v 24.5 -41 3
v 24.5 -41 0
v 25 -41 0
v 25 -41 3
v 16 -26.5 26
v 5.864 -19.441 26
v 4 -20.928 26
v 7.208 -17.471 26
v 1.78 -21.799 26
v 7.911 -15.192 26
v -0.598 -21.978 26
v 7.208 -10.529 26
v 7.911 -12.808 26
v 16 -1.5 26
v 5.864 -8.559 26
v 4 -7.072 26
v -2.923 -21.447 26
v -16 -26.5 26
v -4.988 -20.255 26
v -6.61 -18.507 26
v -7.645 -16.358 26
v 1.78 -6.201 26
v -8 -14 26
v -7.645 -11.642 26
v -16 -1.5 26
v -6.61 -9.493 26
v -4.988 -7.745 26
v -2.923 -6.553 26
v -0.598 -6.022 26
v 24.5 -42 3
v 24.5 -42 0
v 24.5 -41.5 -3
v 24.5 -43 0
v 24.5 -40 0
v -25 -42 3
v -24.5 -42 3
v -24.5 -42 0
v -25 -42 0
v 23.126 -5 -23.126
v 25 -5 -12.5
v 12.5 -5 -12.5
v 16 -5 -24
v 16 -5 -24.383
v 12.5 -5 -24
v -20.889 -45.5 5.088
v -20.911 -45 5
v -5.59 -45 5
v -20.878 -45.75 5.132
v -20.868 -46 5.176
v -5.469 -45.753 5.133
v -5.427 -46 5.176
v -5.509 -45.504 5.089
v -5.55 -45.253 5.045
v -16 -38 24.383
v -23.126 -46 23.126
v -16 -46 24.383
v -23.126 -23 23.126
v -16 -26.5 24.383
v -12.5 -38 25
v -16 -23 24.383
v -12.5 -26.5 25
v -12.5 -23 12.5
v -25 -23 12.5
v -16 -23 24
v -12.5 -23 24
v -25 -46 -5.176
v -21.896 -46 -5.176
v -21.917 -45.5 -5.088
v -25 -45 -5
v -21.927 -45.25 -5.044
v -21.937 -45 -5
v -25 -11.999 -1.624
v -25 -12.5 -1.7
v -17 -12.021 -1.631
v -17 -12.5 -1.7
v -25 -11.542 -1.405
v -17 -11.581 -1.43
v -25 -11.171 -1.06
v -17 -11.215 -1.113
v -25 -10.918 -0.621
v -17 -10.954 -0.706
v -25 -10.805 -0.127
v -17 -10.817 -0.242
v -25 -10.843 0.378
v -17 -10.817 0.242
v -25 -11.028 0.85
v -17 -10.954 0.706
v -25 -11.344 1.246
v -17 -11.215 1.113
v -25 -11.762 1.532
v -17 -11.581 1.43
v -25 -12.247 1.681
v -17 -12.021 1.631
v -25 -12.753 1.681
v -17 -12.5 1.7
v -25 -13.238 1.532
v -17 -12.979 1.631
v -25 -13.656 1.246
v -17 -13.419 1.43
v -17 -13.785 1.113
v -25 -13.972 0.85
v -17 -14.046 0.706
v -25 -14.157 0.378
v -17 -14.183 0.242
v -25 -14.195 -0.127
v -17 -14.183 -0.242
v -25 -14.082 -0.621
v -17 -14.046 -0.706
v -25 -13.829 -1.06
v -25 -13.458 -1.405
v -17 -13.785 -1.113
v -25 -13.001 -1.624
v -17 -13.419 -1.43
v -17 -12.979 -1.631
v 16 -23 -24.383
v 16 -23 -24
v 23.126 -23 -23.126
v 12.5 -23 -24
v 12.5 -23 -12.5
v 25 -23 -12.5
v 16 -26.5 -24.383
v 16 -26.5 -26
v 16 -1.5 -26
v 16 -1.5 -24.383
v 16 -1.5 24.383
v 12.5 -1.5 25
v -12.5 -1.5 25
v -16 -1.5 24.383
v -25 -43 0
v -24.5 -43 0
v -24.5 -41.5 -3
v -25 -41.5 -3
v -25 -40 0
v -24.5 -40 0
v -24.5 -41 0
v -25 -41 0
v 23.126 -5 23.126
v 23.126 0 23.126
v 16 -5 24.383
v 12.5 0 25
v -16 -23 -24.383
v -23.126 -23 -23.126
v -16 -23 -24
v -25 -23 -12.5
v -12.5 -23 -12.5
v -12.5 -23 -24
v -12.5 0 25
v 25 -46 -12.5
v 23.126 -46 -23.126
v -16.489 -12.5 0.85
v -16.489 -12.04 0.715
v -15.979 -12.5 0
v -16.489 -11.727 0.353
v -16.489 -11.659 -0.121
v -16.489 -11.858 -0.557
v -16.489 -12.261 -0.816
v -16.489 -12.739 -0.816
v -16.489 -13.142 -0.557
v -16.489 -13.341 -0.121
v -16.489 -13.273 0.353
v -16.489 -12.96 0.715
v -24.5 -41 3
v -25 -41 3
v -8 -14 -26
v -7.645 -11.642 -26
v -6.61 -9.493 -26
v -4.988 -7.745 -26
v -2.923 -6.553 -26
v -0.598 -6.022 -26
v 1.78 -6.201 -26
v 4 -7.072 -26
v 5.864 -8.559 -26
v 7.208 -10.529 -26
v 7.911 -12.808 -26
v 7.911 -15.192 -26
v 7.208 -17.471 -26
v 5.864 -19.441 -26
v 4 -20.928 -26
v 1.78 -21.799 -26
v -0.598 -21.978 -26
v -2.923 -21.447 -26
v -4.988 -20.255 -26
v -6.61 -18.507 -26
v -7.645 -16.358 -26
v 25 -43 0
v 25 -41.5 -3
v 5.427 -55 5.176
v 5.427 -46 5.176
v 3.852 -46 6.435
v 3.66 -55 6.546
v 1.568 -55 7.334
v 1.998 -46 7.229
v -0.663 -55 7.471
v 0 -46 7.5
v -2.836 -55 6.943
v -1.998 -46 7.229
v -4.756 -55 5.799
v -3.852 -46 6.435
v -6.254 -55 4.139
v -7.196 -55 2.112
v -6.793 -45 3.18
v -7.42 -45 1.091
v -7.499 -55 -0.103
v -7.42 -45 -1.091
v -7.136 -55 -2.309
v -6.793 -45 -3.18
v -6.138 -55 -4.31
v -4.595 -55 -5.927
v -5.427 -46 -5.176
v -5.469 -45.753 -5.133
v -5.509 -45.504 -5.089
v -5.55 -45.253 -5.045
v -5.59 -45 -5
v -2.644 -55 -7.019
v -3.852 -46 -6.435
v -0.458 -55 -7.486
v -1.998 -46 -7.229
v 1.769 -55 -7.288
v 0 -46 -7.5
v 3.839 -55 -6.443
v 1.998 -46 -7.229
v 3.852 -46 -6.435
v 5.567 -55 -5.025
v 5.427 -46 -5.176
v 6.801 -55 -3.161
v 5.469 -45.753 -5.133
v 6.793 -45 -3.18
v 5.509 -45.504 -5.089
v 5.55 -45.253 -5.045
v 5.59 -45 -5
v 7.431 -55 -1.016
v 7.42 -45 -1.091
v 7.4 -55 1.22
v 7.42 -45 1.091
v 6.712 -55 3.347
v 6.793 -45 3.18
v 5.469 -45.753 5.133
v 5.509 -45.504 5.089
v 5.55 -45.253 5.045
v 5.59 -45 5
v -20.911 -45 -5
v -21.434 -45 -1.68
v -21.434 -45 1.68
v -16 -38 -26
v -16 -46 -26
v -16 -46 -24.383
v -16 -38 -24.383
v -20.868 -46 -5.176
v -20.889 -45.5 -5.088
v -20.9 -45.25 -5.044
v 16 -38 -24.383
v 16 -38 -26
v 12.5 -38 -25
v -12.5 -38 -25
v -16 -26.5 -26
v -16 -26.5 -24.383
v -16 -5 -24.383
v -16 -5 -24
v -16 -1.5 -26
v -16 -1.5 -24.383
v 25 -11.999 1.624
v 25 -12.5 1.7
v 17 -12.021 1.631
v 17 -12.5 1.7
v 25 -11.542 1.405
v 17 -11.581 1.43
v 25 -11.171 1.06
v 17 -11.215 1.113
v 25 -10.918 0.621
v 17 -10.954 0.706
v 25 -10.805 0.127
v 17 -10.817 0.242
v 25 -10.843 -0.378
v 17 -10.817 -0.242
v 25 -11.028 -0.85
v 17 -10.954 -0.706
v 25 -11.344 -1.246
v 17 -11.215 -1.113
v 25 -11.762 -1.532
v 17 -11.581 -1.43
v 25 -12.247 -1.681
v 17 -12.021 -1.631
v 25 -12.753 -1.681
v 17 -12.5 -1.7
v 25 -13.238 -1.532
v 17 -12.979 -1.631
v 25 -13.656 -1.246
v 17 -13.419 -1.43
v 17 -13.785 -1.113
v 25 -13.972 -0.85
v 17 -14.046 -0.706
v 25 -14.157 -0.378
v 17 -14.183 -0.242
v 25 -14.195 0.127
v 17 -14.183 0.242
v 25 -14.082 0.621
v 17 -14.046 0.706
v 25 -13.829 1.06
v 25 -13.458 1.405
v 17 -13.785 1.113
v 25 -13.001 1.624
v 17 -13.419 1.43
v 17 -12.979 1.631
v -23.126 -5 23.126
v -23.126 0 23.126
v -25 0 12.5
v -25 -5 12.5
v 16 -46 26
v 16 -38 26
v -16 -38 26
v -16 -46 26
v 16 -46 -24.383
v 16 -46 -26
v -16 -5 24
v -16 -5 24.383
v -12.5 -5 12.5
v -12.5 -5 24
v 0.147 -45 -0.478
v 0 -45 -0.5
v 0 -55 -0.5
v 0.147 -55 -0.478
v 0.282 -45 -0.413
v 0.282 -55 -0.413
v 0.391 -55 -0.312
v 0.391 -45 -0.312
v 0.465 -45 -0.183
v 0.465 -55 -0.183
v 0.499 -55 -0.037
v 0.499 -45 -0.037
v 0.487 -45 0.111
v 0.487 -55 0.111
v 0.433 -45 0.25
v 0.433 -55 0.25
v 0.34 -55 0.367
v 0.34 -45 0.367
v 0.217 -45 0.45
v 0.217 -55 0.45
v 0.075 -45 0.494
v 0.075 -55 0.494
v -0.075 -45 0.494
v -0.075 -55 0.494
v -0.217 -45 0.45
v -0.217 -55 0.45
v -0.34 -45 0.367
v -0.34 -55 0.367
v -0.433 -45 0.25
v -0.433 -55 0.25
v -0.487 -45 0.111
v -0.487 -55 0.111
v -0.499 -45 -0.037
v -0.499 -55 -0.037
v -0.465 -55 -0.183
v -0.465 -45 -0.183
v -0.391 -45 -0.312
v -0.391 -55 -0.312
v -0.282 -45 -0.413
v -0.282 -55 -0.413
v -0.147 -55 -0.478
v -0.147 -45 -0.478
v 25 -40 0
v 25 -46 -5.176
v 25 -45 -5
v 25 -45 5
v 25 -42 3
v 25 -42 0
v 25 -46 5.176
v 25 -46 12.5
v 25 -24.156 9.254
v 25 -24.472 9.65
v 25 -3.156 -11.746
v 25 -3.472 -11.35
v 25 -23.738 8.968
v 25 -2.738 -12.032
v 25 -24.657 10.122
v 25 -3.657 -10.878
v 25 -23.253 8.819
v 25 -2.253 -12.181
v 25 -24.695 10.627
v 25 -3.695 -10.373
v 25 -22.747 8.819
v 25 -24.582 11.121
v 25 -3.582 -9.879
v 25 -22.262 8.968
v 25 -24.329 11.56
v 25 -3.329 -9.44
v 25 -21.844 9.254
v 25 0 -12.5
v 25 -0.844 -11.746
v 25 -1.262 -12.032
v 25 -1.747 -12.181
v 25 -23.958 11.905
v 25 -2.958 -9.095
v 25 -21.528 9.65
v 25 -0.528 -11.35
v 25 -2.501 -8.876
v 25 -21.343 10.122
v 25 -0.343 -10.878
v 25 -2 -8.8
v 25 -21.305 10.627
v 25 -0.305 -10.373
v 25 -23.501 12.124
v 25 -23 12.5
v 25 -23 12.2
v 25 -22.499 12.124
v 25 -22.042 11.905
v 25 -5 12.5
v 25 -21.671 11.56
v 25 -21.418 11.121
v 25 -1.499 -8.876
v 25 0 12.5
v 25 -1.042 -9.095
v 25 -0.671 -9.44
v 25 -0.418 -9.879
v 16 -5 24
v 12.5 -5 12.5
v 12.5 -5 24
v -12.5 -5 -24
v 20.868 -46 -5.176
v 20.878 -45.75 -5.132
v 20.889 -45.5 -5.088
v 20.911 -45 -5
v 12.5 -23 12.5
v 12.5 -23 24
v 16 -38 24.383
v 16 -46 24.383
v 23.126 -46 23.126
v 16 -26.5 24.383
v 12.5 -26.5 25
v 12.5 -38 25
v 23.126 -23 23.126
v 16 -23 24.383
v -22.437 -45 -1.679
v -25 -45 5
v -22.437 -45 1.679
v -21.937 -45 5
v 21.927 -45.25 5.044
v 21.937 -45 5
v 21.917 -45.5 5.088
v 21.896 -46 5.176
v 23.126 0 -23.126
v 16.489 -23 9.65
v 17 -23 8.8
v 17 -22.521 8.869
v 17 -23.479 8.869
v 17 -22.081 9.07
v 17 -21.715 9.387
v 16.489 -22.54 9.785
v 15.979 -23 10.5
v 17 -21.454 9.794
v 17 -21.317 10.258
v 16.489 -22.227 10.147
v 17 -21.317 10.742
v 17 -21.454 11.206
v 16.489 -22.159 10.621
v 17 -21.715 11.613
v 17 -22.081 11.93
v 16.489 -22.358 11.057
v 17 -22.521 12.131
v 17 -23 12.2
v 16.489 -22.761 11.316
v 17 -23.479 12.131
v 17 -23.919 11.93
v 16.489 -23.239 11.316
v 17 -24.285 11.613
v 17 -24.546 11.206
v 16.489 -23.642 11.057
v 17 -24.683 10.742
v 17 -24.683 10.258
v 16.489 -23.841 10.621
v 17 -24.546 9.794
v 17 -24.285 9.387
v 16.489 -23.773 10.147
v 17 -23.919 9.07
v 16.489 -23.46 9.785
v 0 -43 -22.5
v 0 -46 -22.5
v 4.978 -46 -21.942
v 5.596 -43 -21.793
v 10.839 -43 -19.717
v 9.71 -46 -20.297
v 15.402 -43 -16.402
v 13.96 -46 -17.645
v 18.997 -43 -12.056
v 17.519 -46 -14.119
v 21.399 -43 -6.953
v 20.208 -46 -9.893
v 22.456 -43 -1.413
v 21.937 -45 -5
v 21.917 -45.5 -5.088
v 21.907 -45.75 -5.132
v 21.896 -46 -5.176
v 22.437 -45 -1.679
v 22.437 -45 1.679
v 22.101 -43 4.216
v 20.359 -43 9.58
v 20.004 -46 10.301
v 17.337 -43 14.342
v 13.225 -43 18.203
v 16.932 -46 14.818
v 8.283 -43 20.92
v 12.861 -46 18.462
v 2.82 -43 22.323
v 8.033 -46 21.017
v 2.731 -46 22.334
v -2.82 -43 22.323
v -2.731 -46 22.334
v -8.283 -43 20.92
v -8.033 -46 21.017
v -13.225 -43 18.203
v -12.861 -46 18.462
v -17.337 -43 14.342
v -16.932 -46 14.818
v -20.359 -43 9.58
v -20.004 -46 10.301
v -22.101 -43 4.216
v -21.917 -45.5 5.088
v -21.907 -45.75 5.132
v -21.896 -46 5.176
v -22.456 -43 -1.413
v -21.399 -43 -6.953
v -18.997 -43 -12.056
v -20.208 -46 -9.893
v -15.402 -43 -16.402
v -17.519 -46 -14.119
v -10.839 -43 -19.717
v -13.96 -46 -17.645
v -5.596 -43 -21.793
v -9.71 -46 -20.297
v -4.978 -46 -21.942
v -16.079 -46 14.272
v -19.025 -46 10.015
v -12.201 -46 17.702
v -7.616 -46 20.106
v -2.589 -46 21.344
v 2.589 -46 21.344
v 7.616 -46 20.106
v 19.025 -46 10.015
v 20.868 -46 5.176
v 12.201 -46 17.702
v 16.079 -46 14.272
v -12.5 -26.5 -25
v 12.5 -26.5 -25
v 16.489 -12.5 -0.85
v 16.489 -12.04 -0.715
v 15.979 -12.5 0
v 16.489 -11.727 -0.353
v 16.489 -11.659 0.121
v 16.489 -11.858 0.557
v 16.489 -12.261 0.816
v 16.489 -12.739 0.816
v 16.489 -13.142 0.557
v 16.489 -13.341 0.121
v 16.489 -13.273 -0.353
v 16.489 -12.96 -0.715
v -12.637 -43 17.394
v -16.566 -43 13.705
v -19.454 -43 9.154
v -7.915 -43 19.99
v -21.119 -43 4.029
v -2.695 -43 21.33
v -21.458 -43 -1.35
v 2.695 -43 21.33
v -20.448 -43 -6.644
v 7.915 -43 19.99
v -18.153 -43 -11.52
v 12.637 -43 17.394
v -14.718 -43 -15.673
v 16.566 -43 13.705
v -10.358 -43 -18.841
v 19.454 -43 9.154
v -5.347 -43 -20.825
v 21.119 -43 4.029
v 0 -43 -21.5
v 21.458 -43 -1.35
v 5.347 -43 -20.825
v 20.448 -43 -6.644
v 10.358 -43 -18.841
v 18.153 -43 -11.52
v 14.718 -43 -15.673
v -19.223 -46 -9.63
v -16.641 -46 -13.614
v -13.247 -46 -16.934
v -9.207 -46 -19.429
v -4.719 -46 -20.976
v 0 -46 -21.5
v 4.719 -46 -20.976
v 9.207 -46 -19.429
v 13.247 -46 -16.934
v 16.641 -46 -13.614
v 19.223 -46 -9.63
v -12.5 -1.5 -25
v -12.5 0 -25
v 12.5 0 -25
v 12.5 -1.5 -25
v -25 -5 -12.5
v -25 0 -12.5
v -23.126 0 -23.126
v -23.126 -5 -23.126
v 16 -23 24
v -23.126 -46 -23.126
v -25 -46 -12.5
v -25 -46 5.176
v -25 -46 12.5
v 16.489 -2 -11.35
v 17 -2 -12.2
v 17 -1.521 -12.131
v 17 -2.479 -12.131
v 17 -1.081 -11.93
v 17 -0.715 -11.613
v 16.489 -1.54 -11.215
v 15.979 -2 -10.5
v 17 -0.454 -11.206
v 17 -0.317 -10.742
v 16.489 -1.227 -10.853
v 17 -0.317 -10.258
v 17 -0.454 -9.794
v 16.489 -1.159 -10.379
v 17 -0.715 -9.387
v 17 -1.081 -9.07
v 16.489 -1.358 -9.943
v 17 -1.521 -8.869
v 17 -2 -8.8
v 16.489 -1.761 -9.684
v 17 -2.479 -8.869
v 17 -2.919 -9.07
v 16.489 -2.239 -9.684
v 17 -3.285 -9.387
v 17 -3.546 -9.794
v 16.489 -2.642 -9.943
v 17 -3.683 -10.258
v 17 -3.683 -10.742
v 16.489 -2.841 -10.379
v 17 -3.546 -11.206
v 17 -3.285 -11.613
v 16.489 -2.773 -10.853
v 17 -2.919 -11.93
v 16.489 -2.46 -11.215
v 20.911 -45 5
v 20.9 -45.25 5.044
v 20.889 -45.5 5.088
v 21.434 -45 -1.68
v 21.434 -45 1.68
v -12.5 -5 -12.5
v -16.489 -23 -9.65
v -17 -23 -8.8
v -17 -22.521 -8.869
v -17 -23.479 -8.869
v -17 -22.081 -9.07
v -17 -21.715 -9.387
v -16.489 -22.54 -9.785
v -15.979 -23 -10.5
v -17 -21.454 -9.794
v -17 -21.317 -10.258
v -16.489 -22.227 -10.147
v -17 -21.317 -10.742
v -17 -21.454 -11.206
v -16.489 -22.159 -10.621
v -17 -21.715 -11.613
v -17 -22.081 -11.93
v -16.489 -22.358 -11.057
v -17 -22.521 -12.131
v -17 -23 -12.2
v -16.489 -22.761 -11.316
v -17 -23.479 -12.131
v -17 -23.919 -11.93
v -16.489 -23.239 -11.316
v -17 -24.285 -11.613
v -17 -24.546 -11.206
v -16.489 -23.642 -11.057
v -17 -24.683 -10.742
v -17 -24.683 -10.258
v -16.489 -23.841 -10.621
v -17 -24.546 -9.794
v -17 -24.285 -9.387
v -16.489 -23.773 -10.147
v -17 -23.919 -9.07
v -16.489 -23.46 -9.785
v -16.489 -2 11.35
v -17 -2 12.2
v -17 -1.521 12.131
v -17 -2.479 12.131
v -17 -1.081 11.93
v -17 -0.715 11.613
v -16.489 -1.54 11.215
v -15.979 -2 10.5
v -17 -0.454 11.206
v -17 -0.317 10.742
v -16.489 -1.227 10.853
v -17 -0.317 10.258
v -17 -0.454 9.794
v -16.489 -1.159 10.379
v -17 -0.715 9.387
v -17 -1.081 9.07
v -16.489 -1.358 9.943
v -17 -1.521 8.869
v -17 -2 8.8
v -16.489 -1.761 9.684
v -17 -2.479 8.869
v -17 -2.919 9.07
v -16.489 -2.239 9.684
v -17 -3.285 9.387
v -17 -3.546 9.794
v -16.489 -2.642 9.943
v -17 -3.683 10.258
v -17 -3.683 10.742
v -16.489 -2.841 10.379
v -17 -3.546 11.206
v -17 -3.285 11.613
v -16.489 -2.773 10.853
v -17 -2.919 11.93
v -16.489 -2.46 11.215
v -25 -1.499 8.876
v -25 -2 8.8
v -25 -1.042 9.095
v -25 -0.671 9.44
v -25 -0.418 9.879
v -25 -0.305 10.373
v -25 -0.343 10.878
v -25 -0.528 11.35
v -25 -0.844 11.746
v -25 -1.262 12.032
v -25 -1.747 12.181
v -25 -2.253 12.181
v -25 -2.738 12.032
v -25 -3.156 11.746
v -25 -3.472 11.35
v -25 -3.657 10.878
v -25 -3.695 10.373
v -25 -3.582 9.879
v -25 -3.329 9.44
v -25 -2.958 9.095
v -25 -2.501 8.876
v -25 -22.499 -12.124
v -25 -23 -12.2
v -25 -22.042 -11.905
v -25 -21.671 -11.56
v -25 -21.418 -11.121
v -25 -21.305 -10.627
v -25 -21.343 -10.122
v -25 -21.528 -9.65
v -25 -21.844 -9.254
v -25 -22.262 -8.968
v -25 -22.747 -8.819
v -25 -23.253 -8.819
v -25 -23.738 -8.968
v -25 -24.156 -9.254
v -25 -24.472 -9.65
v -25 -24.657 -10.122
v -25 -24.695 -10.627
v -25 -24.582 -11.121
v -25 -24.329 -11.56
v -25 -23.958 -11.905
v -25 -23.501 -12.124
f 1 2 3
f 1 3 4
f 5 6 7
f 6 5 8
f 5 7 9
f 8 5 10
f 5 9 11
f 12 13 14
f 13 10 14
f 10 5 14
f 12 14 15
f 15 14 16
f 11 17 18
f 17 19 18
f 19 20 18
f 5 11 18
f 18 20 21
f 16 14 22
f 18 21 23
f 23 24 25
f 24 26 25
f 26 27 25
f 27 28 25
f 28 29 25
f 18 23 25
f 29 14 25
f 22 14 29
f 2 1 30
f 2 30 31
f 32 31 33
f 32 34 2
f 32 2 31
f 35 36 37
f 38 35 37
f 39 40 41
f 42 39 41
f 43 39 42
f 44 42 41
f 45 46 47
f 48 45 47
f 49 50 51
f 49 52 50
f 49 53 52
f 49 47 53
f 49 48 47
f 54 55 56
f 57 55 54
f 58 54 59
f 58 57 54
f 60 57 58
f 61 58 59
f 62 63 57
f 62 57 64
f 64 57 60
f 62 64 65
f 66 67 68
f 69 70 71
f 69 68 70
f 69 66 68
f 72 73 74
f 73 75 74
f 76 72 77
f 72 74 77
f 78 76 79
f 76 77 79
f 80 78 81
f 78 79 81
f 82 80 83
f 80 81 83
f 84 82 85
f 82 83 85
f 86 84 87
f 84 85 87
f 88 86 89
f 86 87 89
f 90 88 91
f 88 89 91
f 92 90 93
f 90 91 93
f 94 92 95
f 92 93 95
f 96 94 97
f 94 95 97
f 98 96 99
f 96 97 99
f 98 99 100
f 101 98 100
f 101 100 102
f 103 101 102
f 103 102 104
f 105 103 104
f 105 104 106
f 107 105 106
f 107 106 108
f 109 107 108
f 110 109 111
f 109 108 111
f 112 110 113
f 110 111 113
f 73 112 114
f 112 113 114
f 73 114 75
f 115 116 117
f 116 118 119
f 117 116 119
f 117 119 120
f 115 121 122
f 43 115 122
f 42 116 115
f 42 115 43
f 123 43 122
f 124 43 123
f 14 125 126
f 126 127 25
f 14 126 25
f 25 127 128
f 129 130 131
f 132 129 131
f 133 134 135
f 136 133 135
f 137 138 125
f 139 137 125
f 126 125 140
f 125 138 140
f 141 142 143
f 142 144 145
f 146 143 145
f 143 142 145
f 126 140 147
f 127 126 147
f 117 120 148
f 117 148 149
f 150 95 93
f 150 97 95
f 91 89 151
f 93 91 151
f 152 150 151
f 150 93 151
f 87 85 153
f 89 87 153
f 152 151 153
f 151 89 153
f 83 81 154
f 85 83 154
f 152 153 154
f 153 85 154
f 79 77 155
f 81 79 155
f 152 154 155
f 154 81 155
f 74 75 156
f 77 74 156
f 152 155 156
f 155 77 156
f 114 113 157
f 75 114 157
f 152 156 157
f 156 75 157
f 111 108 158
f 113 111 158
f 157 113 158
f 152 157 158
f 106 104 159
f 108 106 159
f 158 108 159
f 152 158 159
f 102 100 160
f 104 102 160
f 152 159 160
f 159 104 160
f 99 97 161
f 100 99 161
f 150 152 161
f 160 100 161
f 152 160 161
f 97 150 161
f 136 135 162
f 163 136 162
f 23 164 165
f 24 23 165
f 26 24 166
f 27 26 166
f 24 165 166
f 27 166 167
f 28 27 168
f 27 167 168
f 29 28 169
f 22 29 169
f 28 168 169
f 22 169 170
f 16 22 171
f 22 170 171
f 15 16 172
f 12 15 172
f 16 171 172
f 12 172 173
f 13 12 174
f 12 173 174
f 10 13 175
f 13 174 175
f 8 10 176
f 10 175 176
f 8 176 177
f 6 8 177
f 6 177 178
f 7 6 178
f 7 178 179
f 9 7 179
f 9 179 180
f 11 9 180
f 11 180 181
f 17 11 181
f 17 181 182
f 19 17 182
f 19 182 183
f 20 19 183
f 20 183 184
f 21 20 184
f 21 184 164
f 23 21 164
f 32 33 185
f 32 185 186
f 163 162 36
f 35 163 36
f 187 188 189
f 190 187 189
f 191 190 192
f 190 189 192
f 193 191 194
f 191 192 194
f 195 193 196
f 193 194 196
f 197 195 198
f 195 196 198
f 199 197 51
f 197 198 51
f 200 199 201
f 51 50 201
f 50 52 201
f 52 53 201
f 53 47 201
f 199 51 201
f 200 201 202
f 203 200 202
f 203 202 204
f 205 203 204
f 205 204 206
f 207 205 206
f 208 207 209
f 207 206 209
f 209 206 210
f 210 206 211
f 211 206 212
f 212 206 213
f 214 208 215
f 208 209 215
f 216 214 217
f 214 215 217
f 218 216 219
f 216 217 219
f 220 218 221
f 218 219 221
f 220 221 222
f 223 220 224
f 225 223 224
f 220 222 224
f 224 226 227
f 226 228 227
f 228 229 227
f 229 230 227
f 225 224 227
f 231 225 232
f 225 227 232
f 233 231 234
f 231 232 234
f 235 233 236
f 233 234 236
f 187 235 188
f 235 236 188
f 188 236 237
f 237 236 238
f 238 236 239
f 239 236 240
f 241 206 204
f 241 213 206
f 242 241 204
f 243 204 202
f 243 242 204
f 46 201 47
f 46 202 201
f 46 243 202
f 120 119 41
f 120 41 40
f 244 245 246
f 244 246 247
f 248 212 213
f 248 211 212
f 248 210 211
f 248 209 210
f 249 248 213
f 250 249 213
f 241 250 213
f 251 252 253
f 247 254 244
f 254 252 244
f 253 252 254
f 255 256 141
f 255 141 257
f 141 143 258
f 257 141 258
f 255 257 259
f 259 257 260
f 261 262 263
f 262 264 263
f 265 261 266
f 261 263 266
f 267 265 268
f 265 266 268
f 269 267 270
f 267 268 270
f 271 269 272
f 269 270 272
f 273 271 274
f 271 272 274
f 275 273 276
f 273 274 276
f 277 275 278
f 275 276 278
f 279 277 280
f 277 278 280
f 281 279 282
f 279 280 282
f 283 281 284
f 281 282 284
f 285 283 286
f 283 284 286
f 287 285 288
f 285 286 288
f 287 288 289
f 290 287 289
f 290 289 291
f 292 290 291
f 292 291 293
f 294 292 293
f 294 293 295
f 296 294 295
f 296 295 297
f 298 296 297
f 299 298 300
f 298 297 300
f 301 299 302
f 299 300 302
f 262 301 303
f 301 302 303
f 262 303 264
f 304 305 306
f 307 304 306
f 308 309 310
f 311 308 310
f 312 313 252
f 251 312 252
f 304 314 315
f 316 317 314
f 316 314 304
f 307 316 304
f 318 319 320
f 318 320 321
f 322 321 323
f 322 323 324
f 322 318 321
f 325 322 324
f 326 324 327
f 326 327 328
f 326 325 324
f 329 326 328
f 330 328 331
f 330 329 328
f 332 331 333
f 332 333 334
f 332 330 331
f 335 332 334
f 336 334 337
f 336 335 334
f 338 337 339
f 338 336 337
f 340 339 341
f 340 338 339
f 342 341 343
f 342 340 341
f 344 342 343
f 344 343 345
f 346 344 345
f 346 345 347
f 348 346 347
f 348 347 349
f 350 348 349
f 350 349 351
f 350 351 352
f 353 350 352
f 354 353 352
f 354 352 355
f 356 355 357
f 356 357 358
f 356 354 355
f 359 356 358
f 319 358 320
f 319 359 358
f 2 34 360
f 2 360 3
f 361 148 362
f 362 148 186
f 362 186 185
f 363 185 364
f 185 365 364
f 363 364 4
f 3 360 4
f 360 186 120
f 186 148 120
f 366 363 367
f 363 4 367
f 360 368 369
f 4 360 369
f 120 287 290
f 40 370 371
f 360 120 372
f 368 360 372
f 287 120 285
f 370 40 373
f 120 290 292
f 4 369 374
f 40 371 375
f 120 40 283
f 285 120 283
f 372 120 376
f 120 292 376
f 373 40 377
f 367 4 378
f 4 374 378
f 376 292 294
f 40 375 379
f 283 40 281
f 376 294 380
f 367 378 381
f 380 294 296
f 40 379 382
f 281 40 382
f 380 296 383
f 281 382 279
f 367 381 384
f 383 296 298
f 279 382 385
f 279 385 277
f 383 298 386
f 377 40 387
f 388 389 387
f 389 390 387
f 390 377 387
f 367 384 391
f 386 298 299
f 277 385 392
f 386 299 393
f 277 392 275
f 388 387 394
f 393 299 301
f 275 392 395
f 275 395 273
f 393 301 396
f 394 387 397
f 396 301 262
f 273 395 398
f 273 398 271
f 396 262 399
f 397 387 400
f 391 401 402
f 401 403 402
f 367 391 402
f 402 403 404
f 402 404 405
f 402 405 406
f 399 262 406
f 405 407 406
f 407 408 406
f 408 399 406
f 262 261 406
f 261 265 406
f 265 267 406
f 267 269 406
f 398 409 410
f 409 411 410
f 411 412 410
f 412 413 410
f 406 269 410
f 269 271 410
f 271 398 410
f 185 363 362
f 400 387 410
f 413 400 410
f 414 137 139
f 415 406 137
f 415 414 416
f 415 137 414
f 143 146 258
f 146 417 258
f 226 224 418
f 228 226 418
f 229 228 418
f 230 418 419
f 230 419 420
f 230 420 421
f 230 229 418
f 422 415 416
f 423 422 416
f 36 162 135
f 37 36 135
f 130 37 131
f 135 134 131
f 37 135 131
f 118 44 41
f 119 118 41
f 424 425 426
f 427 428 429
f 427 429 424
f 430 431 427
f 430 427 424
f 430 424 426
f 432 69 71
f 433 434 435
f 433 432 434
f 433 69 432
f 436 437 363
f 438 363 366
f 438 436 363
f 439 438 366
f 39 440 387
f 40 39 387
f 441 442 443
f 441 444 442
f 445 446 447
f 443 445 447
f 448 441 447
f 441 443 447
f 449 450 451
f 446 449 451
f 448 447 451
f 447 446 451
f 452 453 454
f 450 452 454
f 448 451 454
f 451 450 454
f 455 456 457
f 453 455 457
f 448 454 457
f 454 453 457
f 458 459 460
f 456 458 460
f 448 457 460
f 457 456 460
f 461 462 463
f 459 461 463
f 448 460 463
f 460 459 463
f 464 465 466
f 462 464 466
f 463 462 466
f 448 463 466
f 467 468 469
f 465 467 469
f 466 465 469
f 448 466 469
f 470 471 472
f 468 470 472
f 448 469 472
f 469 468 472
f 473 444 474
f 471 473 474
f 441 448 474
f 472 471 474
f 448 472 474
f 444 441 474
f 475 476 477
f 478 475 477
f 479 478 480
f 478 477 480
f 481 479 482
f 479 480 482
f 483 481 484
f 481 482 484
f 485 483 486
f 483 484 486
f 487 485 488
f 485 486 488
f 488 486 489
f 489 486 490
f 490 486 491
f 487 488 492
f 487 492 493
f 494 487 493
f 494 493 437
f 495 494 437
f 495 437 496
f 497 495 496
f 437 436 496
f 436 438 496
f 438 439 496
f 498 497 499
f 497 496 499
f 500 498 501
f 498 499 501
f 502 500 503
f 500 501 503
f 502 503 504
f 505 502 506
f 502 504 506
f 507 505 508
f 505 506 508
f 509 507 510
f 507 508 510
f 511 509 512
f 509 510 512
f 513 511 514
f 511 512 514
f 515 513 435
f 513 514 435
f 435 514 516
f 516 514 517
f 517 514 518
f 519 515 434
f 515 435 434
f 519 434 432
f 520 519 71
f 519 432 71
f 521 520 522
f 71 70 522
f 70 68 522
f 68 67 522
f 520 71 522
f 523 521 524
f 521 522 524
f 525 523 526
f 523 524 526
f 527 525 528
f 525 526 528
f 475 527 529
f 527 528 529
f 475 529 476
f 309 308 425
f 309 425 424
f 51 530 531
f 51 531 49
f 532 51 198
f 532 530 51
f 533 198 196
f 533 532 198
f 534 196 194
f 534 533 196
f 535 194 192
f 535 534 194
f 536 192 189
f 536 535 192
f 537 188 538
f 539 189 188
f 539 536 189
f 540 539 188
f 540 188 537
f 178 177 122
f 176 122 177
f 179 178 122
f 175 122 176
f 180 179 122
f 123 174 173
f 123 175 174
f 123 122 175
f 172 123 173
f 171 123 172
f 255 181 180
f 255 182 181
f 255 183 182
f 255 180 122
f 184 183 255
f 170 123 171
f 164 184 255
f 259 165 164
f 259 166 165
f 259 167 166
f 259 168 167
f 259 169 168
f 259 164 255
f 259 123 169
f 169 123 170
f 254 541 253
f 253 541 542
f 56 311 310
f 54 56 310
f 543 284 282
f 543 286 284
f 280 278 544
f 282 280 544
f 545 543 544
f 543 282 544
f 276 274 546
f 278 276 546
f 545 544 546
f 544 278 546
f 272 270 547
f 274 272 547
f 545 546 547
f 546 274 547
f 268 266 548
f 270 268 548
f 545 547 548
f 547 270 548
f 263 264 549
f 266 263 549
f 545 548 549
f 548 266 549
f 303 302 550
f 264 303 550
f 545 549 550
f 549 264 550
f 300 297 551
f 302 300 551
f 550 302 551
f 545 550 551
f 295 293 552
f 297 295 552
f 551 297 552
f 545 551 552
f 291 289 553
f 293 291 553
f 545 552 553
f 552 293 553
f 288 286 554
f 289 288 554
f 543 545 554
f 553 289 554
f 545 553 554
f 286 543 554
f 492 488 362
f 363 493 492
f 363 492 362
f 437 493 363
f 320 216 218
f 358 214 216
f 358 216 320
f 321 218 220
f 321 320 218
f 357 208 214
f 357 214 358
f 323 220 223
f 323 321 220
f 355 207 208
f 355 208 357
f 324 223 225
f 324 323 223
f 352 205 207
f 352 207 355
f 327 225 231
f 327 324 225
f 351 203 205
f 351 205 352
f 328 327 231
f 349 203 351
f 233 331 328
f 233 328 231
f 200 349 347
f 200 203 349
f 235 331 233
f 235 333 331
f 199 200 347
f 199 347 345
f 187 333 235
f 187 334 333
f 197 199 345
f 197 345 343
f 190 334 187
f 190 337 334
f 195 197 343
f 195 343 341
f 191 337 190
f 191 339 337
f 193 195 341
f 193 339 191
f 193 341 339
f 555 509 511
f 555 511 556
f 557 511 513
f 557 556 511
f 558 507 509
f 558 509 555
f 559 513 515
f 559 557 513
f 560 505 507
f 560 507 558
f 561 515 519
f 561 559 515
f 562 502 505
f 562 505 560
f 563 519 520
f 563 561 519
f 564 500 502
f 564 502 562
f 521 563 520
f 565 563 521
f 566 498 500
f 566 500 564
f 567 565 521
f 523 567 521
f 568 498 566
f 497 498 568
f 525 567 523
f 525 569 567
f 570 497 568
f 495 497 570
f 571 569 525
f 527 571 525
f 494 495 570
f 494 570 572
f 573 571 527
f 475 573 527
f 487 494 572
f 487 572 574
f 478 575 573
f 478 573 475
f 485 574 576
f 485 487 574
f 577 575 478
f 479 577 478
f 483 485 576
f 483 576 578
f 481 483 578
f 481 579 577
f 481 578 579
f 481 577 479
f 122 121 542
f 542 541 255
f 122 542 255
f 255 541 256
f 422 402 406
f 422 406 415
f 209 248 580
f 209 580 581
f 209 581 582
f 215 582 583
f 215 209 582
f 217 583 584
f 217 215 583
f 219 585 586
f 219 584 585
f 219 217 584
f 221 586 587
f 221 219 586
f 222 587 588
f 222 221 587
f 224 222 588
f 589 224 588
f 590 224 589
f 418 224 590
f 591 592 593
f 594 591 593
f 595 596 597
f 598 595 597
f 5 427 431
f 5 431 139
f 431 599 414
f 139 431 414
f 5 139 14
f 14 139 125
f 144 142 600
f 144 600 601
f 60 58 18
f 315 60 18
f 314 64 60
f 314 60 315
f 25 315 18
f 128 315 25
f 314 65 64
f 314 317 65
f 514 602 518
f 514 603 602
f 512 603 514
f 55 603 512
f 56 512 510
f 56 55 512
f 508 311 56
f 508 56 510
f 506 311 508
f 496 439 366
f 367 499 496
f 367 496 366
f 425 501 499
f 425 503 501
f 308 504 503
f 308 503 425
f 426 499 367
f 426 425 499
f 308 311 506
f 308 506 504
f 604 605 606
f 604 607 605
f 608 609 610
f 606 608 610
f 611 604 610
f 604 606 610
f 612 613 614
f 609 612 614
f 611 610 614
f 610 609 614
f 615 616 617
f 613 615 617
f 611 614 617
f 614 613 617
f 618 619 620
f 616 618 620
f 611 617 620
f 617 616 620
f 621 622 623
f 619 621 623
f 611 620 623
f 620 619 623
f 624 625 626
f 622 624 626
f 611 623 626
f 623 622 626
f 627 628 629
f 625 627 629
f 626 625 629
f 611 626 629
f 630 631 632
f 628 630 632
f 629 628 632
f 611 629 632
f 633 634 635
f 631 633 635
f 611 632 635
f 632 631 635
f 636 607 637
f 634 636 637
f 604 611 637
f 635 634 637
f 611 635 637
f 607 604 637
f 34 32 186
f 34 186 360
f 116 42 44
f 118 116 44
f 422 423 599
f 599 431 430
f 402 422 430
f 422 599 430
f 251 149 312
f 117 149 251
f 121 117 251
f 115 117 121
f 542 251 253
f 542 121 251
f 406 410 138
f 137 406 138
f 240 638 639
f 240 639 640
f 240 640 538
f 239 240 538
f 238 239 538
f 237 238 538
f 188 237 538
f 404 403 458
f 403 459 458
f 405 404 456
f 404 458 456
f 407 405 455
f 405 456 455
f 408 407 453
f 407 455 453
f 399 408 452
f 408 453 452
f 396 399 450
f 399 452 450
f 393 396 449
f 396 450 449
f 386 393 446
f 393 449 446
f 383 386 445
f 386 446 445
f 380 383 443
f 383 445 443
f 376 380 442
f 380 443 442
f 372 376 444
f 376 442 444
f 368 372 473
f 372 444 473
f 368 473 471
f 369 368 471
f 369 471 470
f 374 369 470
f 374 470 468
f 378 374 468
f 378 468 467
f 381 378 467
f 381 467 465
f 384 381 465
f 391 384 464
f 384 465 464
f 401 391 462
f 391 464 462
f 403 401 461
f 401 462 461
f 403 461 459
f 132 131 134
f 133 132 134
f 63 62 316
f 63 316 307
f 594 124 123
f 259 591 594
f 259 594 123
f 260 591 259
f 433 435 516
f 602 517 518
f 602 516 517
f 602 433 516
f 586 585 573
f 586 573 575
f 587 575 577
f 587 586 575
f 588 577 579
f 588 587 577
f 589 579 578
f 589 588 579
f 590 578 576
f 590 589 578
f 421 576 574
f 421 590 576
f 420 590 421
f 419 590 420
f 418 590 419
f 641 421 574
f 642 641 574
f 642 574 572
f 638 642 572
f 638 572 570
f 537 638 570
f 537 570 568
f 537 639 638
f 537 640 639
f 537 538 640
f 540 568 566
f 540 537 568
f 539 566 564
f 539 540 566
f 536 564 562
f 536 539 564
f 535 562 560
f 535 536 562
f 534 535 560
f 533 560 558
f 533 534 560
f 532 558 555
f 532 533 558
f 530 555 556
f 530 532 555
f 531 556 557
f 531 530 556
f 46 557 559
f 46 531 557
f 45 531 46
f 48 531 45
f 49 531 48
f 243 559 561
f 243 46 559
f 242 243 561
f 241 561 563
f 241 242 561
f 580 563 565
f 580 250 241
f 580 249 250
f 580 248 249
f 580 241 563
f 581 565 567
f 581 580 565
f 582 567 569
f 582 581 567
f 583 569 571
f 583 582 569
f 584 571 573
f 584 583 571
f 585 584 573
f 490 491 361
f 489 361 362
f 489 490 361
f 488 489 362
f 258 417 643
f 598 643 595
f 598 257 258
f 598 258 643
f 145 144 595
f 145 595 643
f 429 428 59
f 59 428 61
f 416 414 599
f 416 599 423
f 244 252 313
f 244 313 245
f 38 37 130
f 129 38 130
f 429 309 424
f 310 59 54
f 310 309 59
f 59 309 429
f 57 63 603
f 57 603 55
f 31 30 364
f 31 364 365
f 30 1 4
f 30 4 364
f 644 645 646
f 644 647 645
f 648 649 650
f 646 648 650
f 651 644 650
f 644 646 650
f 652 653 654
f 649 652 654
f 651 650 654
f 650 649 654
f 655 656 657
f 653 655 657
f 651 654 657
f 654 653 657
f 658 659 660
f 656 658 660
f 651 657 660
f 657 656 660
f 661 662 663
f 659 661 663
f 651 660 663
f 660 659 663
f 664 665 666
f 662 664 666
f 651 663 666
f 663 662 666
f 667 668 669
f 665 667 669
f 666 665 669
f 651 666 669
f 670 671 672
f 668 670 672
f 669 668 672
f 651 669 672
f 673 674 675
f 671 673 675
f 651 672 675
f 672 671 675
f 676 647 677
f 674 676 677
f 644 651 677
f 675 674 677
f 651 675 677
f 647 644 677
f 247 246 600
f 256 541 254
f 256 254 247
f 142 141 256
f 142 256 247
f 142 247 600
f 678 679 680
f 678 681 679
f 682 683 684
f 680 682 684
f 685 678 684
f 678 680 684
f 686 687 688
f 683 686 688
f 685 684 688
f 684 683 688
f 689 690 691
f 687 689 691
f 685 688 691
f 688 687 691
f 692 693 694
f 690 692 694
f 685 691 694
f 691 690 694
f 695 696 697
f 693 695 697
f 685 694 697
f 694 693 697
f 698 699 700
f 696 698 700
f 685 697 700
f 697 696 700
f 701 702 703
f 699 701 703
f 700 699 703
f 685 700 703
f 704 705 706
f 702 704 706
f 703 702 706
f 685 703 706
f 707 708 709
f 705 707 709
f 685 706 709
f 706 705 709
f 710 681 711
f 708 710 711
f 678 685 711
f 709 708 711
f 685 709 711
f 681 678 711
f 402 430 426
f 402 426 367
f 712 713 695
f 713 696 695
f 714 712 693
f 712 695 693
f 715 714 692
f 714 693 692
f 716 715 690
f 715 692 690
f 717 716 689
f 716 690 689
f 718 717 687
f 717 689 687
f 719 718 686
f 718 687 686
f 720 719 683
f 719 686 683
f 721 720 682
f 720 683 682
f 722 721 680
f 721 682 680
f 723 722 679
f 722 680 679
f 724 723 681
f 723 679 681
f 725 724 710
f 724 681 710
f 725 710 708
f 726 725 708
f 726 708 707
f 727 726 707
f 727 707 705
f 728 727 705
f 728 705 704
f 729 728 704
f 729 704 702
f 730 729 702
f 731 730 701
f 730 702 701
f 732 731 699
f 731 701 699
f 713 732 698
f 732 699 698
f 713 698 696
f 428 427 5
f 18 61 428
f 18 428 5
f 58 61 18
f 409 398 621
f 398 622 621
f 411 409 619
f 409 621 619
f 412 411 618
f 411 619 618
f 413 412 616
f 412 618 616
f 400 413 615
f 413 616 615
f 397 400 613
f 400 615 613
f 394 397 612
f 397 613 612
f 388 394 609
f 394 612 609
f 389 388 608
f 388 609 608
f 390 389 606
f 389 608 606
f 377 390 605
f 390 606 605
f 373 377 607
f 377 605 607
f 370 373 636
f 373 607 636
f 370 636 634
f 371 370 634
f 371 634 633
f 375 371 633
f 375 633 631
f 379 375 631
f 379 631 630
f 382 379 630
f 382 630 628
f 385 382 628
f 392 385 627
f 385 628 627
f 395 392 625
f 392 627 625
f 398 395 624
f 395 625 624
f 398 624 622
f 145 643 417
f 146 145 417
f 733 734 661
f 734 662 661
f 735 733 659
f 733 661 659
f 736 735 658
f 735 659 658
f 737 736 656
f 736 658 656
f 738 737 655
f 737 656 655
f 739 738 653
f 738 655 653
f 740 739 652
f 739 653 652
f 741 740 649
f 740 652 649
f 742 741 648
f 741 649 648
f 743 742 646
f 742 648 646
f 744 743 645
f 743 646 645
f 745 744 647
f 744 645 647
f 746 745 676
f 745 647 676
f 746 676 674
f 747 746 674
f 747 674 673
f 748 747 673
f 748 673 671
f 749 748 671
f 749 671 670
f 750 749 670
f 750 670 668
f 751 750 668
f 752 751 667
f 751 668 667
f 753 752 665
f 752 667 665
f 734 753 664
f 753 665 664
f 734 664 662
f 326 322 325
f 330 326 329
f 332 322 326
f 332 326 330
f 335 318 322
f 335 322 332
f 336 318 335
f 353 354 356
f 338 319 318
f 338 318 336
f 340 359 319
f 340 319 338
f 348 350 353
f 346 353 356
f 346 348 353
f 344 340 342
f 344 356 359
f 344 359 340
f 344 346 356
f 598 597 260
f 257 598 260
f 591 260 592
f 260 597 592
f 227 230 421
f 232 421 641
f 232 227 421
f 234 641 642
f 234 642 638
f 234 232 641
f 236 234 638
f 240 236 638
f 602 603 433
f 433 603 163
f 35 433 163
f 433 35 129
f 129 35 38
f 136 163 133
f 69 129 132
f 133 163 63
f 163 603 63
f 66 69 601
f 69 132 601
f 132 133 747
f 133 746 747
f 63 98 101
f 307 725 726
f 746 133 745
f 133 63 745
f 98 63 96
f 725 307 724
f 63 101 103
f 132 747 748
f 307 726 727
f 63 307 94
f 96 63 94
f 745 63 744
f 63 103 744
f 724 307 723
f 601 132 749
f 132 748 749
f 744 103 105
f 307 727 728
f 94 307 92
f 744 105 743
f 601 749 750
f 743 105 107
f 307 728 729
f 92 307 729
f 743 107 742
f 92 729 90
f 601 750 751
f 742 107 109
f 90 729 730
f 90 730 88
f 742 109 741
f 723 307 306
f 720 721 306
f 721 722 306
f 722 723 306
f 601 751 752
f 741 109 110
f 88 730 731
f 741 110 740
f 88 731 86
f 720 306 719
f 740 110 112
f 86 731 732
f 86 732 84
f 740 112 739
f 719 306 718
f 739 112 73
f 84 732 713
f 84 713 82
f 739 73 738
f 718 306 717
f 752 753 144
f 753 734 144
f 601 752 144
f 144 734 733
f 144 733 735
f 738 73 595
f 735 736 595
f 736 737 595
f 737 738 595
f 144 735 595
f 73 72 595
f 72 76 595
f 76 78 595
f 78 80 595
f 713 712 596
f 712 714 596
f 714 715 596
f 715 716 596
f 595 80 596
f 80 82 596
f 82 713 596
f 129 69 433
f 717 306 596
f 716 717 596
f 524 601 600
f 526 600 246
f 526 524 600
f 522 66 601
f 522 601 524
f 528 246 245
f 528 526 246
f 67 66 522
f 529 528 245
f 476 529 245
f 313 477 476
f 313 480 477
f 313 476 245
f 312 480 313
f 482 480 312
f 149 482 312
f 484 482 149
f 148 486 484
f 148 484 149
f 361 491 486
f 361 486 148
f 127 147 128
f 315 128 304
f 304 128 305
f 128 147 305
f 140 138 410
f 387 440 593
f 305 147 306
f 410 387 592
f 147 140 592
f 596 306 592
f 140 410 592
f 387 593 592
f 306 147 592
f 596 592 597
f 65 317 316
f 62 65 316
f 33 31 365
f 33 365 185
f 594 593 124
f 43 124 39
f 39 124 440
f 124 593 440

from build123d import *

# Parameters (mm, degrees)
BOSS_EXTRUDE1_DEPTH      = 5
BOSS_EXTRUDE2_DEPTH      = 18
BOSS_EXTRUDE3_DEPTH      = 23
SKETCH4_W                = 32
SKETCH4_H                = 25
SKETCH4_H_2              = 8
BOSS_EXTRUDE4_DEPTH      = 1
CUT_EXTRUDE1_DEPTH       = 73.746133918
CUT_EXTRUDE1_DEPTH_BACK  = 73.746133918
WRAP1_START              = -0.5
WRAP1_DEPTH              = 0.5
SKETCH8_R                = 7.5
SKETCH8_R_2              = 0.5
BOSS_EXTRUDE5_DEPTH      = 10
SKETCH9_R                = 8
CUT_EXTRUDE2_DEPTH       = 80.711981534
M3_CLEARANCE_HOLE1_D     = 3.4
M3_CLEARANCE_HOLE1_DEPTH = 8
M3_CLEARANCE_HOLE1_TIP   = 1.021463052
M3_CLEARANCE_HOLE2_D     = 3.4
M3_CLEARANCE_HOLE2_DEPTH = 8
M3_CLEARANCE_HOLE2_TIP   = 1.021463052
M3_CLEARANCE_HOLE3_D     = 3.4
M3_CLEARANCE_HOLE3_DEPTH = 8
M3_CLEARANCE_HOLE3_TIP   = 1.021463052
M3_CLEARANCE_HOLE4_D     = 3.4
M3_CLEARANCE_HOLE4_DEPTH = 8
M3_CLEARANCE_HOLE4_TIP   = 1.021463052
SKETCH22_R               = 22.5
SKETCH22_R_2             = 21.5
CUT_EXTRUDE3_DEPTH       = 3


# Read off the part's stored shape, not the designer's step: Wrap1
with BuildPart() as part:
    # Sketch1 → Boss-Extrude1 (new body)
    with BuildSketch(Plane(origin=(0, 0, 0), x_dir=(1, 0, 0), z_dir=(0, 1, 0))):
        Polygon((-25, 12.5), (-23.126297114, 23.126297114), (-12.5, 25), (12.5, 25), (23.126297114, 23.126297114), (25, 12.5), (25, -12.5), (23.126297114, -23.126297114), (12.5, -25), (-12.5, -25), (-23.126297114, -23.126297114), (-25, -12.5), align=None)
    extrude(amount=-BOSS_EXTRUDE1_DEPTH)

    # Sketch2 → Boss-Extrude2 (add)
    with BuildSketch(Plane.XZ.offset(5)):
        Polygon((-12.5, 25), (-12.5, 12.5), (-25, 12.5), (-25, -12.5), (-12.5, -12.5), (-12.5, -25), (12.5, -25), (12.5, -12.5), (25, -12.5), (25, 12.5), (12.5, 12.5), (12.5, 25), align=None)
    extrude(amount=BOSS_EXTRUDE2_DEPTH)

    # Sketch3 → Boss-Extrude3 (add)
    with BuildSketch(Plane.XZ.offset(23)):
        Polygon((12.5, 25), (-12.5, 25), (-12.5, 12.5), (-25, 12.5), (-25, -12.5), (-12.5, -12.5), (-12.5, -25), (12.5, -25), (12.5, -12.5), (25, -12.5), (25, 12.5), (12.5, 12.5), align=None)
        Polygon((-25, 12.5), (-23.126297114, 23.126297114), (-12.5, 25), (-12.5, 12.5), align=None)
        Polygon((12.5, 25), (23.126297114, 23.126297114), (25, 12.5), (12.5, 12.5), align=None)
        Polygon((-12.5, -25), (-23.126297114, -23.126297114), (-25, -12.5), (-12.5, -12.5), align=None)
        Polygon((25, -12.5), (23.126297114, -23.126297114), (12.5, -25), (12.5, -12.5), align=None)
    extrude(amount=BOSS_EXTRUDE3_DEPTH)

    # Sketch4 → Boss-Extrude4 (add, symmetric)
    with BuildSketch(Plane(origin=(0, 0, -25), x_dir=(-1, 0, 0), z_dir=(0, 0, -1))):
        with Locations((0, -14)):
            Rectangle(SKETCH4_W, SKETCH4_H)
        with Locations((0, -42)):
            Rectangle(SKETCH4_W, SKETCH4_H_2)
    boss_extrude4 = extrude(amount=BOSS_EXTRUDE4_DEPTH, both=True)

    # Mirror2: Boss-Extrude4 across plane
    add(boss_extrude4.mirror(Plane.XY))

    # Sketch6 → Cut-Extrude1 (cut, two sides: drawn at the far end of the back side and taken through both)
    with BuildSketch(Plane(origin=(25, 0, 0), x_dir=(0, 0, -1), z_dir=(1, 0, 0)).offset(-CUT_EXTRUDE1_DEPTH_BACK)):
        Polygon((5, -45), (-5, -45), (-5.176326981, -46), (5.176326981, -46), align=None)
    extrude(amount=CUT_EXTRUDE1_DEPTH + CUT_EXTRUDE1_DEPTH_BACK, mode=Mode.SUBTRACT)

    # Wrap1 outline → Wrap1 (cut)
    with BuildSketch(Plane(origin=(25, 0, 0), x_dir=(0, 0, -1), z_dir=(1, 0, 0)).offset(WRAP1_START)):
        Polygon((0, -41), (-3, -41), (-3, -42), (0, -42), (0, -43), (3, -41.5), (0, -40), align=None)
    wrap1 = extrude(amount=WRAP1_DEPTH, mode=Mode.SUBTRACT)

    # Mirror3: Wrap1 across plane
    add(wrap1.mirror(Plane(origin=(0, 0, 0), x_dir=(0, 0, 1), z_dir=(1, 0, 0))), mode=Mode.SUBTRACT)

    # Sketch8 → Boss-Extrude5 (add)
    with BuildSketch(Plane.XZ.offset(45)):
        with Locations(Location((0, 0, 0), (0, 0, 43.644116102))):
            Circle(SKETCH8_R)
        with Locations(Location((0, 0, 0), (0, 0, 270))):
            Circle(SKETCH8_R_2, mode=Mode.SUBTRACT)
    extrude(amount=BOSS_EXTRUDE5_DEPTH)

    # Sketch9 → Cut-Extrude2 (cut, through all)
    with BuildSketch(Plane(origin=(0, 0, -26), x_dir=(-1, 0, 0), z_dir=(0, 0, -1))):
        with Locations((0, -14)):
            Circle(SKETCH9_R)
    extrude(amount=-CUT_EXTRUDE2_DEPTH, mode=Mode.SUBTRACT)

    # M3 Clearance Hole1
    with Locations(Plane(origin=(25, 0, 0), x_dir=(0, 0, -1), z_dir=(1, 0, 0))):
        with Locations((10.5, -2), (-10.5, -23)):
            Hole(M3_CLEARANCE_HOLE1_D / 2, depth=M3_CLEARANCE_HOLE1_DEPTH)
            with Locations((0, 0, -(M3_CLEARANCE_HOLE1_DEPTH + M3_CLEARANCE_HOLE1_TIP / 2))):  # 118° drill point
                Cone(0, M3_CLEARANCE_HOLE1_D / 2, M3_CLEARANCE_HOLE1_TIP, mode=Mode.SUBTRACT)

    # M3 Clearance Hole2
    with Locations(Plane.ZY.offset(25)):
        with Locations((10.5, -2), (-10.5, -23)):
            Hole(M3_CLEARANCE_HOLE2_D / 2, depth=M3_CLEARANCE_HOLE2_DEPTH)
            with Locations((0, 0, -(M3_CLEARANCE_HOLE2_DEPTH + M3_CLEARANCE_HOLE2_TIP / 2))):  # 118° drill point
                Cone(0, M3_CLEARANCE_HOLE2_D / 2, M3_CLEARANCE_HOLE2_TIP, mode=Mode.SUBTRACT)

    # M3 Clearance Hole3
    with Locations(Plane(origin=(25, 0, 0), x_dir=(0, 0, -1), z_dir=(1, 0, 0))):
        with Locations((0, -12.5)):
            Hole(M3_CLEARANCE_HOLE3_D / 2, depth=M3_CLEARANCE_HOLE3_DEPTH)
            with Locations((0, 0, -(M3_CLEARANCE_HOLE3_DEPTH + M3_CLEARANCE_HOLE3_TIP / 2))):  # 118° drill point
                Cone(0, M3_CLEARANCE_HOLE3_D / 2, M3_CLEARANCE_HOLE3_TIP, mode=Mode.SUBTRACT)

    # M3 Clearance Hole4
    with Locations(Plane.ZY.offset(25)):
        with Locations((0, -12.5)):
            Hole(M3_CLEARANCE_HOLE4_D / 2, depth=M3_CLEARANCE_HOLE4_DEPTH)
            with Locations((0, 0, -(M3_CLEARANCE_HOLE4_DEPTH + M3_CLEARANCE_HOLE4_TIP / 2))):  # 118° drill point
                Cone(0, M3_CLEARANCE_HOLE4_D / 2, M3_CLEARANCE_HOLE4_TIP, mode=Mode.SUBTRACT)

    # Sketch22 → Cut-Extrude3 (cut)
    with BuildSketch(Plane.XZ.offset(46)):
        with Locations(Location((0, 0, 0), (0, 0, 270))):
            Circle(SKETCH22_R)
        with Locations(Location((0, 0, 0), (0, 0, 270))):
            Circle(SKETCH22_R_2, mode=Mode.SUBTRACT)
    extrude(amount=-CUT_EXTRUDE3_DEPTH, mode=Mode.SUBTRACT)


solid = part.part
